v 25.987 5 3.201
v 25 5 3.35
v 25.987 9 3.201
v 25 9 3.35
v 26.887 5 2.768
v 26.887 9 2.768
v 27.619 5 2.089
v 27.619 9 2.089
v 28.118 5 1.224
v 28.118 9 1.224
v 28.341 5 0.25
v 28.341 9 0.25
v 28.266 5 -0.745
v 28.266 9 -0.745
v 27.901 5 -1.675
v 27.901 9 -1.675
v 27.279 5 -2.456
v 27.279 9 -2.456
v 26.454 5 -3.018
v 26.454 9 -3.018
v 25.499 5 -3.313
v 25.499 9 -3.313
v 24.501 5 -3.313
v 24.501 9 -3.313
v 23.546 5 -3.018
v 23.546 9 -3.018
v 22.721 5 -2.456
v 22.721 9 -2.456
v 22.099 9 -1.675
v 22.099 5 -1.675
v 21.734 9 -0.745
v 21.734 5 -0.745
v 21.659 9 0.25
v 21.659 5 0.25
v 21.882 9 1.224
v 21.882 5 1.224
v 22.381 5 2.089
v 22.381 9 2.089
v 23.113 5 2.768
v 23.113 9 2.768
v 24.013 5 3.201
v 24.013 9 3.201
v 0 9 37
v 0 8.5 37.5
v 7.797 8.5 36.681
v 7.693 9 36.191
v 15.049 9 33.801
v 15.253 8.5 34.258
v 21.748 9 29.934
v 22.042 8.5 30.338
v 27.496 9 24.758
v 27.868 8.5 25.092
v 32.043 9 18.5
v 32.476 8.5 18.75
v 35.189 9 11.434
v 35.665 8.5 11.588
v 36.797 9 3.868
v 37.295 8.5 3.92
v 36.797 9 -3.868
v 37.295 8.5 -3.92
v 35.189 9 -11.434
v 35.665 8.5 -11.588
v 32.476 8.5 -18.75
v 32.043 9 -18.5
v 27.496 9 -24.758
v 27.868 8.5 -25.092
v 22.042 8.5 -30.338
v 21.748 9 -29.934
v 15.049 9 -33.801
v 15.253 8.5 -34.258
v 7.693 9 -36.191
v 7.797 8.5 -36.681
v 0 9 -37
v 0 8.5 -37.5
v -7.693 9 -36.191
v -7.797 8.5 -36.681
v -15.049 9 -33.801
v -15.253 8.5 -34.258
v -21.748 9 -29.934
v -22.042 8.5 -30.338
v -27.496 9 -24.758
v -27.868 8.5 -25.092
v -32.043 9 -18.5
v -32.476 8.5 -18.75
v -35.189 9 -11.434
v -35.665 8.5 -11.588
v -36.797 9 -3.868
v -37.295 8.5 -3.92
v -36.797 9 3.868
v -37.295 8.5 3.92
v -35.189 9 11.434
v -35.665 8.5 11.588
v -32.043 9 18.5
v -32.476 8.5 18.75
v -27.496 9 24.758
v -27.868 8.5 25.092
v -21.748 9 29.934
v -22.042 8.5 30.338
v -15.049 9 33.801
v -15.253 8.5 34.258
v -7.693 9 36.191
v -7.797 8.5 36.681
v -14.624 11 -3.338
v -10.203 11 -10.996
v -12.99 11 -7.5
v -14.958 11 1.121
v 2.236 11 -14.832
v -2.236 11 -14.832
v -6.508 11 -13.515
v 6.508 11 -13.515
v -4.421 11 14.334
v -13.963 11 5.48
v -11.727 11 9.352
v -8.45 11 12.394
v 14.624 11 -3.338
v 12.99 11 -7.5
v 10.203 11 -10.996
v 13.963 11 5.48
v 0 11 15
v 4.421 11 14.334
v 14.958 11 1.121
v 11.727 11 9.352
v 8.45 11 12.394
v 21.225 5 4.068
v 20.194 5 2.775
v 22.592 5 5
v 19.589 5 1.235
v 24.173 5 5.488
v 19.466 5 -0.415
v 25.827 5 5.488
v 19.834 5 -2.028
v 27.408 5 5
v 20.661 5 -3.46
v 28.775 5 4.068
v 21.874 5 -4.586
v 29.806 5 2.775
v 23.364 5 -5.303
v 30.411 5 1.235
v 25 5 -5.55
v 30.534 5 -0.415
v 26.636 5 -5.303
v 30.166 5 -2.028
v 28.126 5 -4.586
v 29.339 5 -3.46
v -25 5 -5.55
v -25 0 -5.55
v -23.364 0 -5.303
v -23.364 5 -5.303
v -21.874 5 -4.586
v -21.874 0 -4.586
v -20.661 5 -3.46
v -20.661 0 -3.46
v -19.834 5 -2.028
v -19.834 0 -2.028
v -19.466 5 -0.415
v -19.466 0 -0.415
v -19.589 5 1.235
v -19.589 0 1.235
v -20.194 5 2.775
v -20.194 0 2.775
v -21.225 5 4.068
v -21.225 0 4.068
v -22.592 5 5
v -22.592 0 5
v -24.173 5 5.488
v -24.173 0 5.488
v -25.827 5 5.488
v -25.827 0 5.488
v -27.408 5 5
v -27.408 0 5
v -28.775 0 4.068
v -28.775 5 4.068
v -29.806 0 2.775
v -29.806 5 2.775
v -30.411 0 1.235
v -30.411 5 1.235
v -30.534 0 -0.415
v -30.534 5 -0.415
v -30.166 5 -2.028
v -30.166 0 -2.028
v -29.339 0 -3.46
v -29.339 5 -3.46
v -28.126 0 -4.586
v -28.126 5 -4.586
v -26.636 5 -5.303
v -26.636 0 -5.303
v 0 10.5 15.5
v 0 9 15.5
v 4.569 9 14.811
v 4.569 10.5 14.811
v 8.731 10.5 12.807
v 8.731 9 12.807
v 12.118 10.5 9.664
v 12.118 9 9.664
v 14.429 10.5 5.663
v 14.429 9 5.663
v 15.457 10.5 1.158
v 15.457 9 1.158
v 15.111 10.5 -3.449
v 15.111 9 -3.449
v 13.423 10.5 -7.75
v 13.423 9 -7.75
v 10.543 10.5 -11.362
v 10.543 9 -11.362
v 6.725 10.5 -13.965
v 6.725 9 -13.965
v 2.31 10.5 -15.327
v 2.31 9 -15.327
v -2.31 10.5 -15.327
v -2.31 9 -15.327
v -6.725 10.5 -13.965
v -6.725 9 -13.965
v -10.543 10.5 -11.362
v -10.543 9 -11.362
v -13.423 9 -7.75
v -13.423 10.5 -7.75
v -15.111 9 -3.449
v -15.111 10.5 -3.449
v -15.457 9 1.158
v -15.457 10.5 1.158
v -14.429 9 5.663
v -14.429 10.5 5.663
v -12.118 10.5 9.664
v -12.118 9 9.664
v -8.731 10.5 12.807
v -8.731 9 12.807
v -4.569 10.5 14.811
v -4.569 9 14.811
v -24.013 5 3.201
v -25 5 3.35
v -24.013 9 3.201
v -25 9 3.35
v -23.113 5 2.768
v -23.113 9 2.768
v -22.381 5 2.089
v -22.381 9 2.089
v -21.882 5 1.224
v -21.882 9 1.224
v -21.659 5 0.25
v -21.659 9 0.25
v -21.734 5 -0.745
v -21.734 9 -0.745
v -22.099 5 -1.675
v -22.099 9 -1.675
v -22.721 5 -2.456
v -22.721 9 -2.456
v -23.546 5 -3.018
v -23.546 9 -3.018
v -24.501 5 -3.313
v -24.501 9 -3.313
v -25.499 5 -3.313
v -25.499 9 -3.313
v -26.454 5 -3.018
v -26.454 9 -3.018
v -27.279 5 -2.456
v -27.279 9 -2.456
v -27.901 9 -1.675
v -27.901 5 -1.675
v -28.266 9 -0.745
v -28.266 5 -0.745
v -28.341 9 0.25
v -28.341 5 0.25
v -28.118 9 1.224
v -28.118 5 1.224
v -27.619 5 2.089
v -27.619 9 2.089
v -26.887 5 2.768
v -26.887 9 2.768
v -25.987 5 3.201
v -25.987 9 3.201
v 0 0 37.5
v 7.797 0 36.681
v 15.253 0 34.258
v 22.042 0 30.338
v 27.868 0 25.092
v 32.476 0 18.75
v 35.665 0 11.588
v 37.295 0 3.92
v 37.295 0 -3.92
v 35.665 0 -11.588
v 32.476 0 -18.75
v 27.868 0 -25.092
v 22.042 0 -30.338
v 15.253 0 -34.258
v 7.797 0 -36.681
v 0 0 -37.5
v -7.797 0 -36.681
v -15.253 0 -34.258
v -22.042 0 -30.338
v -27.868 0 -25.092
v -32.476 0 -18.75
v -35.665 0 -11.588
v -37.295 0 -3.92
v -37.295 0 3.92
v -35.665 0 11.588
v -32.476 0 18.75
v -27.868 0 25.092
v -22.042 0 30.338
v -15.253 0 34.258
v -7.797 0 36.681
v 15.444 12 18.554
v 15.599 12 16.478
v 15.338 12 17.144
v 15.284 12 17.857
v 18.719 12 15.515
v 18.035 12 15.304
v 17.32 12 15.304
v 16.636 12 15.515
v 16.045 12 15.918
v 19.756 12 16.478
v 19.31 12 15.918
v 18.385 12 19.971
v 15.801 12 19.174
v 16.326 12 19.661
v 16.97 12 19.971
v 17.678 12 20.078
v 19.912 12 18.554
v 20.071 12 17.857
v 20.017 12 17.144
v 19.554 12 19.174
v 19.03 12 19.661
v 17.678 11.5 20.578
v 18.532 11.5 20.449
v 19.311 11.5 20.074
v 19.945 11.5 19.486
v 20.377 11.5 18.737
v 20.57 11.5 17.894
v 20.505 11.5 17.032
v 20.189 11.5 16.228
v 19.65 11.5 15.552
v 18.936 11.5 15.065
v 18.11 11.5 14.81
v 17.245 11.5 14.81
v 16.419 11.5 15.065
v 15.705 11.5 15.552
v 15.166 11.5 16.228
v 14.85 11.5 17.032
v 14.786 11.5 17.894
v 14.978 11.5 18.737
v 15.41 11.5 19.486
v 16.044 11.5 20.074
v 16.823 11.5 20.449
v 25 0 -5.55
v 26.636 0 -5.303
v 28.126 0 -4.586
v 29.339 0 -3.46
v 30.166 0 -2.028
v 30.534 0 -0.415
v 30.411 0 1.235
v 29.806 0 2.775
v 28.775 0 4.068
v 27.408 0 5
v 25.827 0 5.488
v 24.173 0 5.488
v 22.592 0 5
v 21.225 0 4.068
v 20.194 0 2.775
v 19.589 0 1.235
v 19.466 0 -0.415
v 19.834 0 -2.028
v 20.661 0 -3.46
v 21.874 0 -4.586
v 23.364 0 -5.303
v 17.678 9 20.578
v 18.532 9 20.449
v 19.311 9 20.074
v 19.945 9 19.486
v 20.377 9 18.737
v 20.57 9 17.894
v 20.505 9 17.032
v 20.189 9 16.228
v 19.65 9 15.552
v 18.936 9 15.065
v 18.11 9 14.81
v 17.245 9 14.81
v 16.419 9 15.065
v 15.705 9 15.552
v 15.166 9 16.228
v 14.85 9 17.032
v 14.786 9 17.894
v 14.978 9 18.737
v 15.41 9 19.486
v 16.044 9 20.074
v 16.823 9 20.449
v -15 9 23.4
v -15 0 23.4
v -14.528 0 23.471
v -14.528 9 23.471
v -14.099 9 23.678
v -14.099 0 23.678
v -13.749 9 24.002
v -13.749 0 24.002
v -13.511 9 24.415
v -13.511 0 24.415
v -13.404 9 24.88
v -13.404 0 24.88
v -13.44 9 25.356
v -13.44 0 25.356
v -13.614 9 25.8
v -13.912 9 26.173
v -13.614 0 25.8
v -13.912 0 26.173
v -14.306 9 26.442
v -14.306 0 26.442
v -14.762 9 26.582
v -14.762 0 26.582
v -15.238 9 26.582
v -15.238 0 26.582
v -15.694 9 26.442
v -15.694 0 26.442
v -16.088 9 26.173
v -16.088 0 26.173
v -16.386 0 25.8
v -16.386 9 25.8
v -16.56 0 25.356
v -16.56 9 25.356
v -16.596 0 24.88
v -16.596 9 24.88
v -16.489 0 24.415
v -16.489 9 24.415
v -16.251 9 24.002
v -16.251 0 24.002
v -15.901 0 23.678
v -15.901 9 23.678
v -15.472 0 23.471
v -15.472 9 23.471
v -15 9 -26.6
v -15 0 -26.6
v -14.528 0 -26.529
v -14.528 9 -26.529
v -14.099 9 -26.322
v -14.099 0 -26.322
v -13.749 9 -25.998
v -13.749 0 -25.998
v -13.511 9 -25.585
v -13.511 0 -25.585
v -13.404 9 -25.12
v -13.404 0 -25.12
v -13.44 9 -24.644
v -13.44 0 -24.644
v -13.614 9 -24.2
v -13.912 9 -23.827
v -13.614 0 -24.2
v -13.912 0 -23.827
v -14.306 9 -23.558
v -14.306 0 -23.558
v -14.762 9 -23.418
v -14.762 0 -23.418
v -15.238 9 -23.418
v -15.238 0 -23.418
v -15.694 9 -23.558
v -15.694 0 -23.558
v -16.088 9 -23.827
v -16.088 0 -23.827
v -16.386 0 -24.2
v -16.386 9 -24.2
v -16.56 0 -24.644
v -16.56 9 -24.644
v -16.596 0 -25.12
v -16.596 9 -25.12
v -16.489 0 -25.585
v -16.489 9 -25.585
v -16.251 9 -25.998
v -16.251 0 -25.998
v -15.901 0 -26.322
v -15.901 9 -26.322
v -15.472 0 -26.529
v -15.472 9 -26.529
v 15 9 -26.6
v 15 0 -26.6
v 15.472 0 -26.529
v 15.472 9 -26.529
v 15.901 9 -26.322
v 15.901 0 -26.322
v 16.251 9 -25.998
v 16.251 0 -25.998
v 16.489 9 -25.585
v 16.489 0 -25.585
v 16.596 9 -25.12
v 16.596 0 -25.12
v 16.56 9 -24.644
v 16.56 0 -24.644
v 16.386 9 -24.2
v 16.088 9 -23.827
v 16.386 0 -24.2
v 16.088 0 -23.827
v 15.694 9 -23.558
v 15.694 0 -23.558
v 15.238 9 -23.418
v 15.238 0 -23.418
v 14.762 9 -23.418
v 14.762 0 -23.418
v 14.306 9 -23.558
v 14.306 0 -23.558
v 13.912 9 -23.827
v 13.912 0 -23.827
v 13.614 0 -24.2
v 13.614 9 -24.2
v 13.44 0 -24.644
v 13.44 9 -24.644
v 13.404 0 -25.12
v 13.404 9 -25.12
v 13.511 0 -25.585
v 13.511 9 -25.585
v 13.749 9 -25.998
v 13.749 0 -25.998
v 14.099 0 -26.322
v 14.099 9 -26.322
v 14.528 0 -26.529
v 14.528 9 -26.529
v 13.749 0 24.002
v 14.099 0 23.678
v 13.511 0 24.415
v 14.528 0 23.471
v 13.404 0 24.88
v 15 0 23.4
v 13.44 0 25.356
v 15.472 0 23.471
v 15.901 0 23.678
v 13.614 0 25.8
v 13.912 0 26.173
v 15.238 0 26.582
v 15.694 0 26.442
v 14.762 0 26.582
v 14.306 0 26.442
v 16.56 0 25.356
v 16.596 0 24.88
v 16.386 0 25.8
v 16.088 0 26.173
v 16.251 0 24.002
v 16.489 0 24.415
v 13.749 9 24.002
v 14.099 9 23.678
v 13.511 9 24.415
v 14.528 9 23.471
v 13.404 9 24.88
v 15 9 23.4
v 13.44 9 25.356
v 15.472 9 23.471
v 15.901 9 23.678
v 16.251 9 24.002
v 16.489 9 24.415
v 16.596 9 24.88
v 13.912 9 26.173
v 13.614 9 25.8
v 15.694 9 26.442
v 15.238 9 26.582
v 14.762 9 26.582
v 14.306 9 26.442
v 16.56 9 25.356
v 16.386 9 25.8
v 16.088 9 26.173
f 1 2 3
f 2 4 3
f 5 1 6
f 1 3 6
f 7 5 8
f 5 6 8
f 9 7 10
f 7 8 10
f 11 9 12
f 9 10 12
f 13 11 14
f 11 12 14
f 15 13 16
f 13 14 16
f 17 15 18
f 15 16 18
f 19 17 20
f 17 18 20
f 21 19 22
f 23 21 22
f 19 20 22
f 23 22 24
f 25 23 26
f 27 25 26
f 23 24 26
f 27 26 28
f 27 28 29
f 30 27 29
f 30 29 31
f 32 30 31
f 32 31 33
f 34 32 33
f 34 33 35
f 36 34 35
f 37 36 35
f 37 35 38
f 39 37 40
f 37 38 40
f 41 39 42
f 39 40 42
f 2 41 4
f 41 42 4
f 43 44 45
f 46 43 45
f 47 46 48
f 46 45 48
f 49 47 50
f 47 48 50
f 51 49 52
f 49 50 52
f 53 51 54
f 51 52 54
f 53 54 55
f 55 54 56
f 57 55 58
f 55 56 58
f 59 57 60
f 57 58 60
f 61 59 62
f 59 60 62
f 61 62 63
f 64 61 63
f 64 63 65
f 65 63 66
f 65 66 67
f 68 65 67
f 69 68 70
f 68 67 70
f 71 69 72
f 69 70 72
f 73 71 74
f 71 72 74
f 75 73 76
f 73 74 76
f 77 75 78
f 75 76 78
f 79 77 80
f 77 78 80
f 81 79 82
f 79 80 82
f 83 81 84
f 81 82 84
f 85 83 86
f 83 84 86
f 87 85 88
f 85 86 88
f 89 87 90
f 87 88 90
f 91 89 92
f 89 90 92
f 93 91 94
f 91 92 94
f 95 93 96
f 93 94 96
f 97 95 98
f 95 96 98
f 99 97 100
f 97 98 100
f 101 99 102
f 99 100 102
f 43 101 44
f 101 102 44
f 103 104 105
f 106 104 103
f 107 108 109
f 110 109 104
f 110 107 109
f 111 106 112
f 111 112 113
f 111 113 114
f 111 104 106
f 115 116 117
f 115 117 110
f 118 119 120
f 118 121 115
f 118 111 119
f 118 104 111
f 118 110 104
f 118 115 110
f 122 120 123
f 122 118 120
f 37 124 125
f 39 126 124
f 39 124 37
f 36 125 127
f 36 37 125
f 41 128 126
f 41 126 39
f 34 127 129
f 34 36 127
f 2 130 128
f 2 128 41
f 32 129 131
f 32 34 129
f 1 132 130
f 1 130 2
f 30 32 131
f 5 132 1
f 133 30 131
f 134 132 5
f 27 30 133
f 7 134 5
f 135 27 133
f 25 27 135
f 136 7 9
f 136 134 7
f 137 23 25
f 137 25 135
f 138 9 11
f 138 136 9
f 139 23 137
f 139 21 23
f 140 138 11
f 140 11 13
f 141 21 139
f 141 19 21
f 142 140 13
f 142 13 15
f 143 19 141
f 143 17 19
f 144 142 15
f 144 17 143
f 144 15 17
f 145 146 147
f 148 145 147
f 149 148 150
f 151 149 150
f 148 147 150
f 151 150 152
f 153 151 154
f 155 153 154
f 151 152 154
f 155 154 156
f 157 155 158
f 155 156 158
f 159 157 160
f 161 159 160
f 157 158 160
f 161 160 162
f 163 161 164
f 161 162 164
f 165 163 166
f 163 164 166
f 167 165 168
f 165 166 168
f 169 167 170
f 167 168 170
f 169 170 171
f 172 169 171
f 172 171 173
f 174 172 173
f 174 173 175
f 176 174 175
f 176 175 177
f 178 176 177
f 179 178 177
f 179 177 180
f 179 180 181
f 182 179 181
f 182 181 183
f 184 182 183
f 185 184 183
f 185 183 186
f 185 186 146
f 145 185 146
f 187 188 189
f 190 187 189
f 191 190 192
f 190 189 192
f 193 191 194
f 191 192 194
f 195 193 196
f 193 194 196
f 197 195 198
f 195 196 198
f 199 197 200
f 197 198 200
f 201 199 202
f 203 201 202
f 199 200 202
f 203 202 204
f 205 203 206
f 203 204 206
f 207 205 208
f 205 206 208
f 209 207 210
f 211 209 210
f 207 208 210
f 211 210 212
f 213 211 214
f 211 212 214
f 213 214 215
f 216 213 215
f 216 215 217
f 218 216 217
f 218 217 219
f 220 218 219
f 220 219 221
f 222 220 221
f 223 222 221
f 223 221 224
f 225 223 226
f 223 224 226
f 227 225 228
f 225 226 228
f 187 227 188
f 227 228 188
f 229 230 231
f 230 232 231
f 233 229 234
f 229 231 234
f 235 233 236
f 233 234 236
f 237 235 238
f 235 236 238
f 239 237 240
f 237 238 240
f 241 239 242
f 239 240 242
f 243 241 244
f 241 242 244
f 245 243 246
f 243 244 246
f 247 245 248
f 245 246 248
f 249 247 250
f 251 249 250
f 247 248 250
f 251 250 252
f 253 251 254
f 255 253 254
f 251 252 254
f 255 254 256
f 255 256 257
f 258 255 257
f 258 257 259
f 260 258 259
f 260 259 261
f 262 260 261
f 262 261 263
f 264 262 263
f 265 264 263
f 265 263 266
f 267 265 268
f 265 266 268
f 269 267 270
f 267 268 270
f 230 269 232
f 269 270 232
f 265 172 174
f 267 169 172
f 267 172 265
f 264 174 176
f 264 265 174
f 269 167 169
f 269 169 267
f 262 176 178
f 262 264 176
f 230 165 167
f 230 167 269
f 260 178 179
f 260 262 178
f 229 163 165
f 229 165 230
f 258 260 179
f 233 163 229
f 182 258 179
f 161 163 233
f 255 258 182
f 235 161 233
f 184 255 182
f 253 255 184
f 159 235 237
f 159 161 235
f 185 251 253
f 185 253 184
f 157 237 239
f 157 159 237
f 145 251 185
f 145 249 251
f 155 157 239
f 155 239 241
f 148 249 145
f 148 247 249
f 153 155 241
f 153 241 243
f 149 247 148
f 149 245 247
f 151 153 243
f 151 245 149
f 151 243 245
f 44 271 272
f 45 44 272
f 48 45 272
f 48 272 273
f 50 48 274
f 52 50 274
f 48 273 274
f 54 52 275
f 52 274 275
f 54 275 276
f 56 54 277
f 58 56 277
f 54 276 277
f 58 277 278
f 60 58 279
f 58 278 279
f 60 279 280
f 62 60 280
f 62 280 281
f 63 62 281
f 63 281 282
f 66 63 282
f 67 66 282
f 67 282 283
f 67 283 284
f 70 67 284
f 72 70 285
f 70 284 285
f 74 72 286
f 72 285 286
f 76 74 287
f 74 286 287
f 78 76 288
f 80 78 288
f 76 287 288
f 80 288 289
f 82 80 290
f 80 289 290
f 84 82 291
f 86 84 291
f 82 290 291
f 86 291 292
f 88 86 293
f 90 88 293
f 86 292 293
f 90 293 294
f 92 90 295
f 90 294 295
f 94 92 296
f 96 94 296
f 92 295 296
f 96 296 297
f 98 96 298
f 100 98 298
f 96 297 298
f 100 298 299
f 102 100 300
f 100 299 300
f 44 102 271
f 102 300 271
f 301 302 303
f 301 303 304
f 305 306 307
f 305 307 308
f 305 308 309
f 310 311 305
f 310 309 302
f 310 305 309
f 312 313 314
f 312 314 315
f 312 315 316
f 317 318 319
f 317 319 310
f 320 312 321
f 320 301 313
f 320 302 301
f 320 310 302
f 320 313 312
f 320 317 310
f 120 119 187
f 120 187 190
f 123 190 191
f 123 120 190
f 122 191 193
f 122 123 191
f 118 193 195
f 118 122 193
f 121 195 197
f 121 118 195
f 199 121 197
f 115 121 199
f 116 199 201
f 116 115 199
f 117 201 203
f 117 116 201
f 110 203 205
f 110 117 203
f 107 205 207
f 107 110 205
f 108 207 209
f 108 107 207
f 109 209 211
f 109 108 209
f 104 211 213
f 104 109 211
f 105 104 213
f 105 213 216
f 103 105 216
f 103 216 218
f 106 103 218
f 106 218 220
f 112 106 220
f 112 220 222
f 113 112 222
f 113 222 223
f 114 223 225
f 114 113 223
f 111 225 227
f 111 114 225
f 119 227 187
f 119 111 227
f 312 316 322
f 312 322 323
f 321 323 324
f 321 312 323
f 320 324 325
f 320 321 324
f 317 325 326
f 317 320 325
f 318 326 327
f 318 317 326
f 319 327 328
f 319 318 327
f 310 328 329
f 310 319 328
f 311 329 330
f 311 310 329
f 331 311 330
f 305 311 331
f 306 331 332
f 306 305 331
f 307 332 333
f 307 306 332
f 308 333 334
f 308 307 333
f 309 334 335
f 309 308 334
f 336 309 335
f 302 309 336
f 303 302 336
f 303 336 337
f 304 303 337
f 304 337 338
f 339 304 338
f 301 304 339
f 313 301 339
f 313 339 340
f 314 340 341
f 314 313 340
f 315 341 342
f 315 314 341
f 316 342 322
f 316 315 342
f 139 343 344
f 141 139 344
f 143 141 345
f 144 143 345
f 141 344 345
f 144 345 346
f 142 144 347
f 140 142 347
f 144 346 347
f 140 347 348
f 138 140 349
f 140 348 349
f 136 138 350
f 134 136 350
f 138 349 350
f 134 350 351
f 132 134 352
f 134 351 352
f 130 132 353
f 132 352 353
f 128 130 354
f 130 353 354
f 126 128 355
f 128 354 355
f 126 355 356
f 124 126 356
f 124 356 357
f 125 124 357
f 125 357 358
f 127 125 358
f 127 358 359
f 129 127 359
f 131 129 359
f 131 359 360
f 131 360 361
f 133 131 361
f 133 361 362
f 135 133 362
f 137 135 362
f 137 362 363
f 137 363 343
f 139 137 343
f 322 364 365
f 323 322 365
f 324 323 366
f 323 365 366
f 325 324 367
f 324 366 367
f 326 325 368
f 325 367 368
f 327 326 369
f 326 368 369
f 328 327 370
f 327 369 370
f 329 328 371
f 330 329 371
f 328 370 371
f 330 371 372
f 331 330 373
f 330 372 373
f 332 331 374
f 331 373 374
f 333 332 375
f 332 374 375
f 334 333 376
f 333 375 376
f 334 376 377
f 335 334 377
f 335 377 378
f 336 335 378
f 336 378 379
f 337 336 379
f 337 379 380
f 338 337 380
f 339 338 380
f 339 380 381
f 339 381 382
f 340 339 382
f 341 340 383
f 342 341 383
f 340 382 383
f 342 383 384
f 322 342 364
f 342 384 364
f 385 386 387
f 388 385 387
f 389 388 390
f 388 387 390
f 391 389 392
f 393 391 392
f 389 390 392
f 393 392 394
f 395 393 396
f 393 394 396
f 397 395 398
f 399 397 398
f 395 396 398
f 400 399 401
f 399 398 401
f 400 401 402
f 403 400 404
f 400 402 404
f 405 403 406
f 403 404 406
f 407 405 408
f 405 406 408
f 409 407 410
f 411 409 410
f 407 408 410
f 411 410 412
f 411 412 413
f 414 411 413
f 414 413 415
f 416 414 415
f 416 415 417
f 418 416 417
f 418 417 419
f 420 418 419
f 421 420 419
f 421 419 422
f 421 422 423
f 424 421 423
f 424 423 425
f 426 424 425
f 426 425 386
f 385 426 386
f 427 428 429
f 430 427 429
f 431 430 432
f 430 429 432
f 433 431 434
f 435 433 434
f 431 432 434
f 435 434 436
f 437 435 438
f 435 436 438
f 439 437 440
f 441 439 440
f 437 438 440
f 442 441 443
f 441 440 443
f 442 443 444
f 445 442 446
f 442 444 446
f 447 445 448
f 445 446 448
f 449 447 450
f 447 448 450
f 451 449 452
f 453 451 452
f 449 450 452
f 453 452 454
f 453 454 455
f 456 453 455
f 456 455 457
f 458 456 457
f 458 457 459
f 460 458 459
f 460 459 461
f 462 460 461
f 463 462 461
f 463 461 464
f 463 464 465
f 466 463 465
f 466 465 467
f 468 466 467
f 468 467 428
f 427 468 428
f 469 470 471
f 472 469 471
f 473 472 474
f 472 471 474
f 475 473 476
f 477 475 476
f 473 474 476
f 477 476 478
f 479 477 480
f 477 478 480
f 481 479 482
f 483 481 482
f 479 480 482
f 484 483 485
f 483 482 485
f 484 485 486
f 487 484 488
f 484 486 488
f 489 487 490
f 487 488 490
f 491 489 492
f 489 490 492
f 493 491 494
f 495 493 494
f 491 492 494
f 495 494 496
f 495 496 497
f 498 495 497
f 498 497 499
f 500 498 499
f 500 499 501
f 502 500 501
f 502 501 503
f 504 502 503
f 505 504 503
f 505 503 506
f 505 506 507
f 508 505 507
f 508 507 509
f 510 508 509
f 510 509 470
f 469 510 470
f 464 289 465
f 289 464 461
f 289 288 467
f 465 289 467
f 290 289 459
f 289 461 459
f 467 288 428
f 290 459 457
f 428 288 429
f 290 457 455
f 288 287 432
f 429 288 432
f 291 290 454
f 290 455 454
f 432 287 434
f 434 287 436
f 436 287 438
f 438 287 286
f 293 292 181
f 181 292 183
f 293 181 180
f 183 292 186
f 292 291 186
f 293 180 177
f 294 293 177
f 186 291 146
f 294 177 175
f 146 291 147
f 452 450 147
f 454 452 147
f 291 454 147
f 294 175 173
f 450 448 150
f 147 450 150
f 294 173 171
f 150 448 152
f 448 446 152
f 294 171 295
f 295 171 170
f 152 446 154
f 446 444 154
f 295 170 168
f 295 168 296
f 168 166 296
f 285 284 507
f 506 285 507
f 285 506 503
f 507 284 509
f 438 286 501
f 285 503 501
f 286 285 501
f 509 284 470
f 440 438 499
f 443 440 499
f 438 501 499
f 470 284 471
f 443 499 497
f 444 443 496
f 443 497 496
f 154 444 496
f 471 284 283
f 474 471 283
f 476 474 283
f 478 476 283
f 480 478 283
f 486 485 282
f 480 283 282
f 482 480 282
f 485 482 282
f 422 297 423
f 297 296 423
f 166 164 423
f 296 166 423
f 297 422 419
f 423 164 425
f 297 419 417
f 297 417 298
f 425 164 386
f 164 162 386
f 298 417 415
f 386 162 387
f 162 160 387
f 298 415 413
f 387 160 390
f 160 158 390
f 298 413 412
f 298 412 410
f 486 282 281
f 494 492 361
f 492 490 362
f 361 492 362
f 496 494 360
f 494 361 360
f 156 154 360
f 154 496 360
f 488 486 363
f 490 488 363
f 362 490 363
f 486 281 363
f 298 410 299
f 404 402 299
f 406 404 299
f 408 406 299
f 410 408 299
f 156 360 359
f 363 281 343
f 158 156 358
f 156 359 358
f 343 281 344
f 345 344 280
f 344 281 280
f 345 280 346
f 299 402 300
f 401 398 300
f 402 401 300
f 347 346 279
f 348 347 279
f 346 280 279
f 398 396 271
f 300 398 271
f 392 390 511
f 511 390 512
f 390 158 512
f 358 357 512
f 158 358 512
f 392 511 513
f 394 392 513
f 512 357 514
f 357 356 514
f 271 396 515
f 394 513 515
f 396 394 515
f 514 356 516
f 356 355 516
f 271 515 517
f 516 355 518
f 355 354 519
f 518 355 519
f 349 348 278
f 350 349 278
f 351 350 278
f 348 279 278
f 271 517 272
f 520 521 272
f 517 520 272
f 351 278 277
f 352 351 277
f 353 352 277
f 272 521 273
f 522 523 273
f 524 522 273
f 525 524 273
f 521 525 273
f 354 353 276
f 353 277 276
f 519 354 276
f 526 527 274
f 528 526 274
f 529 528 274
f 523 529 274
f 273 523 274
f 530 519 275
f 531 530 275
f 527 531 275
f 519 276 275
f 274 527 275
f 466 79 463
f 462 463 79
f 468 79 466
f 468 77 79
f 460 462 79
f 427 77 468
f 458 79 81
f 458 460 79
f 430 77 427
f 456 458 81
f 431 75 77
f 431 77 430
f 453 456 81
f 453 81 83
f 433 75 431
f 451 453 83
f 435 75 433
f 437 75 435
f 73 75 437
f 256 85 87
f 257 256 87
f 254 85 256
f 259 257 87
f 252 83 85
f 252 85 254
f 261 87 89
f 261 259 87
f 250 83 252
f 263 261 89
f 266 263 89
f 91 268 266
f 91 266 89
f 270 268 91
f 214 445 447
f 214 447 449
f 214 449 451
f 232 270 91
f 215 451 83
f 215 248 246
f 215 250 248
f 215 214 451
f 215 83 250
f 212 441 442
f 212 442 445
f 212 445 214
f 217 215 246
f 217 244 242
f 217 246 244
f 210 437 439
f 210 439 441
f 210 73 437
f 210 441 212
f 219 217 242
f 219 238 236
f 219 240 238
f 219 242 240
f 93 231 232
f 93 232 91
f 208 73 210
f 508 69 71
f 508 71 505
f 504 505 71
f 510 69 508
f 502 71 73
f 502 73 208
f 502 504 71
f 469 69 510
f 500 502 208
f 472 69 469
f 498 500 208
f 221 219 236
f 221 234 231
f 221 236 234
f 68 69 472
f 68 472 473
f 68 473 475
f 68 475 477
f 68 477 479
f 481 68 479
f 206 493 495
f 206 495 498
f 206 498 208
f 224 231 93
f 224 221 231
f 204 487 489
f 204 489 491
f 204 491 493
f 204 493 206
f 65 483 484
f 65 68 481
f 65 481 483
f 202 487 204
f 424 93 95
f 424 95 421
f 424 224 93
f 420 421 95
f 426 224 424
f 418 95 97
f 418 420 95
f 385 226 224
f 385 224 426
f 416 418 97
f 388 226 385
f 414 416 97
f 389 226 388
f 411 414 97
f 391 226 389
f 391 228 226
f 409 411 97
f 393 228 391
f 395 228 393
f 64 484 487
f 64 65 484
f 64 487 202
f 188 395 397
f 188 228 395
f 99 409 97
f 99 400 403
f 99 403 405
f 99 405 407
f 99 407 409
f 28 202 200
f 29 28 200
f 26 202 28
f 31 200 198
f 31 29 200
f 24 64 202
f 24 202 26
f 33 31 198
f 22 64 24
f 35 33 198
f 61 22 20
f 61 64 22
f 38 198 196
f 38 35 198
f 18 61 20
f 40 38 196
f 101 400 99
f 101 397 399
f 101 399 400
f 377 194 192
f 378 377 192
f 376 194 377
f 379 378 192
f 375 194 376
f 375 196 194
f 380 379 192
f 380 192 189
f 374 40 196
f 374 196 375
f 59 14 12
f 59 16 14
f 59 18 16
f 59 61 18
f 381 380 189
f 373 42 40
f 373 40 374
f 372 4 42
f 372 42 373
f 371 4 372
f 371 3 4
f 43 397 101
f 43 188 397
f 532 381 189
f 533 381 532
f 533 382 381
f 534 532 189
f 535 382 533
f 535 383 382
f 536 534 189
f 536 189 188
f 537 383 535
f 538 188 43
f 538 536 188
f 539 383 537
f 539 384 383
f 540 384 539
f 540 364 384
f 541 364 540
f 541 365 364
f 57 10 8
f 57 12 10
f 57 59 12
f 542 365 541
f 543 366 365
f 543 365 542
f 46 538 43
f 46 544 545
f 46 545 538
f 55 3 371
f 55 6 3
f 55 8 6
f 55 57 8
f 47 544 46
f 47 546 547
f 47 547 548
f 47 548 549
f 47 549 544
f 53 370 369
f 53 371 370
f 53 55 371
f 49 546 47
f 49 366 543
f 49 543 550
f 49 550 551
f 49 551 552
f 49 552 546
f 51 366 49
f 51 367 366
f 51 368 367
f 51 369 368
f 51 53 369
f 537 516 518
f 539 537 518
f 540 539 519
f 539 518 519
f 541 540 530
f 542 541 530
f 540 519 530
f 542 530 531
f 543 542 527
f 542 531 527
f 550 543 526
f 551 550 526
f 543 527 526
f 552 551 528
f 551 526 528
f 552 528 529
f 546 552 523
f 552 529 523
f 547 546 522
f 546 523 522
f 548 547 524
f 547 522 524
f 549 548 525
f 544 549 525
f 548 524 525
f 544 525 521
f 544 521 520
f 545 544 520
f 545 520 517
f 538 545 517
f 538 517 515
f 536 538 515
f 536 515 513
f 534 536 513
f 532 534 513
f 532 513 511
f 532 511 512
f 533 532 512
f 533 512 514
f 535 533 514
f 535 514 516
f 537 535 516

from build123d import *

# Parameters (mm, degrees)
SKIZZE1_R                       = 37.5
SKIZZE1_R_2                     = 3.25
AUFSATZ_LINEAR_AUSTRAGEN1_DEPTH = 9
BOHRUNG1_D                      = 6.7
BOHRUNG1_CBORE_D                = 11.1
BOHRUNG1_CBORE_DEPTH            = 5
SKIZZE3_R                       = 15.5
AUFSATZ_LINEAR_AUSTRAGEN2_DEPTH = 2
FASE1_SIZE                      = 0.5
SKIZZE7_R                       = 1.6
SCHNITT_LINEAR_AUSTRAGEN2_DEPTH = 55.161794653
FASE2_SIZE                      = 0.5
SKIZZE5_R                       = 2.9
AUFSATZ_LINEAR_AUSTRAGEN3_DEPTH = 3
FASE4_SIZE                      = 0.5


with BuildPart() as part:
    # Skizze1 → Aufsatz-Linear austragen1 (new body)
    with BuildSketch(Plane(origin=(0, 0, 0), x_dir=(1, 0, 0), z_dir=(0, 1, 0))):
        with Locations(Location((0, 0, 0), (0, 0, 270))):
            Circle(SKIZZE1_R)
        with Locations(Location((-25, 0, 0), (0, 0, 270))):
            Circle(SKIZZE1_R_2, mode=Mode.SUBTRACT)
        with Locations(Location((25, 0, 0), (0, 0, 270))):
            Circle(SKIZZE1_R_2, mode=Mode.SUBTRACT)
    extrude(amount=AUFSATZ_LINEAR_AUSTRAGEN1_DEPTH)

    # Bohrung1 (through all)
    with Locations(Plane(origin=(25, 0, 0), x_dir=(0, 0, -1), z_dir=(0, -1, 0))):
        with Locations((0, 0), (0, -50)):
            CounterBoreHole(BOHRUNG1_D / 2, BOHRUNG1_CBORE_D / 2, BOHRUNG1_CBORE_DEPTH)

    # Skizze3 → Aufsatz-Linear austragen2 (add)
    with BuildSketch(Plane(origin=(0, 9, 0), x_dir=(-1, 0, 0), z_dir=(0, 1, 0))):
        with Locations(Location((0, 0, 0), (0, 0, 90))):
            Circle(SKIZZE3_R)
    extrude(amount=AUFSATZ_LINEAR_AUSTRAGEN2_DEPTH)

    # Fase1
    fase1_edges = [part.edges().sort_by_distance(p)[0] for p in [
        (0, 11, -15.5),
    ]]
    chamfer(fase1_edges, length=FASE1_SIZE)

    # Skizze7 → Schnitt-Linear austragen2 (cut, through all)
    with BuildSketch(Plane(origin=(0, 0, 0), x_dir=(-1, 0, 0), z_dir=(0, -1, 0))):
        with Locations(Location((-15, 25, 0), (0, 0, 90))):
            Circle(SKIZZE7_R)
        with Locations(Location((15, 25, 0), (0, 0, 90))):
            Circle(SKIZZE7_R)
        with Locations(Location((15, -25, 0), (0, 0, 90))):
            Circle(SKIZZE7_R)
        with Locations(Location((-15, -25, 0), (0, 0, 90))):
            Circle(SKIZZE7_R)
    extrude(amount=-SCHNITT_LINEAR_AUSTRAGEN2_DEPTH, mode=Mode.SUBTRACT)

    # Fase2
    fase2_edges = [part.edges().sort_by_distance(p)[0] for p in [
        (0, 9, -37.5),
    ]]
    chamfer(fase2_edges, length=FASE2_SIZE)

    # Skizze5 → Aufsatz-Linear austragen3 (add)
    with BuildSketch(Plane(origin=(0, 9, 0), x_dir=(-1, 0, 0), z_dir=(0, 1, 0))):
        with Locations(Location((-17.67766953, 17.67766953, 0), (0, 0, 90))):
            Circle(SKIZZE5_R)
    extrude(amount=AUFSATZ_LINEAR_AUSTRAGEN3_DEPTH)

    # Fase4
    fase4_edges = [part.edges().sort_by_distance(p)[0] for p in [
        (17.67766953, 12, 14.77766953),
    ]]
    chamfer(fase4_edges, length=FASE4_SIZE)


solid = part.part
